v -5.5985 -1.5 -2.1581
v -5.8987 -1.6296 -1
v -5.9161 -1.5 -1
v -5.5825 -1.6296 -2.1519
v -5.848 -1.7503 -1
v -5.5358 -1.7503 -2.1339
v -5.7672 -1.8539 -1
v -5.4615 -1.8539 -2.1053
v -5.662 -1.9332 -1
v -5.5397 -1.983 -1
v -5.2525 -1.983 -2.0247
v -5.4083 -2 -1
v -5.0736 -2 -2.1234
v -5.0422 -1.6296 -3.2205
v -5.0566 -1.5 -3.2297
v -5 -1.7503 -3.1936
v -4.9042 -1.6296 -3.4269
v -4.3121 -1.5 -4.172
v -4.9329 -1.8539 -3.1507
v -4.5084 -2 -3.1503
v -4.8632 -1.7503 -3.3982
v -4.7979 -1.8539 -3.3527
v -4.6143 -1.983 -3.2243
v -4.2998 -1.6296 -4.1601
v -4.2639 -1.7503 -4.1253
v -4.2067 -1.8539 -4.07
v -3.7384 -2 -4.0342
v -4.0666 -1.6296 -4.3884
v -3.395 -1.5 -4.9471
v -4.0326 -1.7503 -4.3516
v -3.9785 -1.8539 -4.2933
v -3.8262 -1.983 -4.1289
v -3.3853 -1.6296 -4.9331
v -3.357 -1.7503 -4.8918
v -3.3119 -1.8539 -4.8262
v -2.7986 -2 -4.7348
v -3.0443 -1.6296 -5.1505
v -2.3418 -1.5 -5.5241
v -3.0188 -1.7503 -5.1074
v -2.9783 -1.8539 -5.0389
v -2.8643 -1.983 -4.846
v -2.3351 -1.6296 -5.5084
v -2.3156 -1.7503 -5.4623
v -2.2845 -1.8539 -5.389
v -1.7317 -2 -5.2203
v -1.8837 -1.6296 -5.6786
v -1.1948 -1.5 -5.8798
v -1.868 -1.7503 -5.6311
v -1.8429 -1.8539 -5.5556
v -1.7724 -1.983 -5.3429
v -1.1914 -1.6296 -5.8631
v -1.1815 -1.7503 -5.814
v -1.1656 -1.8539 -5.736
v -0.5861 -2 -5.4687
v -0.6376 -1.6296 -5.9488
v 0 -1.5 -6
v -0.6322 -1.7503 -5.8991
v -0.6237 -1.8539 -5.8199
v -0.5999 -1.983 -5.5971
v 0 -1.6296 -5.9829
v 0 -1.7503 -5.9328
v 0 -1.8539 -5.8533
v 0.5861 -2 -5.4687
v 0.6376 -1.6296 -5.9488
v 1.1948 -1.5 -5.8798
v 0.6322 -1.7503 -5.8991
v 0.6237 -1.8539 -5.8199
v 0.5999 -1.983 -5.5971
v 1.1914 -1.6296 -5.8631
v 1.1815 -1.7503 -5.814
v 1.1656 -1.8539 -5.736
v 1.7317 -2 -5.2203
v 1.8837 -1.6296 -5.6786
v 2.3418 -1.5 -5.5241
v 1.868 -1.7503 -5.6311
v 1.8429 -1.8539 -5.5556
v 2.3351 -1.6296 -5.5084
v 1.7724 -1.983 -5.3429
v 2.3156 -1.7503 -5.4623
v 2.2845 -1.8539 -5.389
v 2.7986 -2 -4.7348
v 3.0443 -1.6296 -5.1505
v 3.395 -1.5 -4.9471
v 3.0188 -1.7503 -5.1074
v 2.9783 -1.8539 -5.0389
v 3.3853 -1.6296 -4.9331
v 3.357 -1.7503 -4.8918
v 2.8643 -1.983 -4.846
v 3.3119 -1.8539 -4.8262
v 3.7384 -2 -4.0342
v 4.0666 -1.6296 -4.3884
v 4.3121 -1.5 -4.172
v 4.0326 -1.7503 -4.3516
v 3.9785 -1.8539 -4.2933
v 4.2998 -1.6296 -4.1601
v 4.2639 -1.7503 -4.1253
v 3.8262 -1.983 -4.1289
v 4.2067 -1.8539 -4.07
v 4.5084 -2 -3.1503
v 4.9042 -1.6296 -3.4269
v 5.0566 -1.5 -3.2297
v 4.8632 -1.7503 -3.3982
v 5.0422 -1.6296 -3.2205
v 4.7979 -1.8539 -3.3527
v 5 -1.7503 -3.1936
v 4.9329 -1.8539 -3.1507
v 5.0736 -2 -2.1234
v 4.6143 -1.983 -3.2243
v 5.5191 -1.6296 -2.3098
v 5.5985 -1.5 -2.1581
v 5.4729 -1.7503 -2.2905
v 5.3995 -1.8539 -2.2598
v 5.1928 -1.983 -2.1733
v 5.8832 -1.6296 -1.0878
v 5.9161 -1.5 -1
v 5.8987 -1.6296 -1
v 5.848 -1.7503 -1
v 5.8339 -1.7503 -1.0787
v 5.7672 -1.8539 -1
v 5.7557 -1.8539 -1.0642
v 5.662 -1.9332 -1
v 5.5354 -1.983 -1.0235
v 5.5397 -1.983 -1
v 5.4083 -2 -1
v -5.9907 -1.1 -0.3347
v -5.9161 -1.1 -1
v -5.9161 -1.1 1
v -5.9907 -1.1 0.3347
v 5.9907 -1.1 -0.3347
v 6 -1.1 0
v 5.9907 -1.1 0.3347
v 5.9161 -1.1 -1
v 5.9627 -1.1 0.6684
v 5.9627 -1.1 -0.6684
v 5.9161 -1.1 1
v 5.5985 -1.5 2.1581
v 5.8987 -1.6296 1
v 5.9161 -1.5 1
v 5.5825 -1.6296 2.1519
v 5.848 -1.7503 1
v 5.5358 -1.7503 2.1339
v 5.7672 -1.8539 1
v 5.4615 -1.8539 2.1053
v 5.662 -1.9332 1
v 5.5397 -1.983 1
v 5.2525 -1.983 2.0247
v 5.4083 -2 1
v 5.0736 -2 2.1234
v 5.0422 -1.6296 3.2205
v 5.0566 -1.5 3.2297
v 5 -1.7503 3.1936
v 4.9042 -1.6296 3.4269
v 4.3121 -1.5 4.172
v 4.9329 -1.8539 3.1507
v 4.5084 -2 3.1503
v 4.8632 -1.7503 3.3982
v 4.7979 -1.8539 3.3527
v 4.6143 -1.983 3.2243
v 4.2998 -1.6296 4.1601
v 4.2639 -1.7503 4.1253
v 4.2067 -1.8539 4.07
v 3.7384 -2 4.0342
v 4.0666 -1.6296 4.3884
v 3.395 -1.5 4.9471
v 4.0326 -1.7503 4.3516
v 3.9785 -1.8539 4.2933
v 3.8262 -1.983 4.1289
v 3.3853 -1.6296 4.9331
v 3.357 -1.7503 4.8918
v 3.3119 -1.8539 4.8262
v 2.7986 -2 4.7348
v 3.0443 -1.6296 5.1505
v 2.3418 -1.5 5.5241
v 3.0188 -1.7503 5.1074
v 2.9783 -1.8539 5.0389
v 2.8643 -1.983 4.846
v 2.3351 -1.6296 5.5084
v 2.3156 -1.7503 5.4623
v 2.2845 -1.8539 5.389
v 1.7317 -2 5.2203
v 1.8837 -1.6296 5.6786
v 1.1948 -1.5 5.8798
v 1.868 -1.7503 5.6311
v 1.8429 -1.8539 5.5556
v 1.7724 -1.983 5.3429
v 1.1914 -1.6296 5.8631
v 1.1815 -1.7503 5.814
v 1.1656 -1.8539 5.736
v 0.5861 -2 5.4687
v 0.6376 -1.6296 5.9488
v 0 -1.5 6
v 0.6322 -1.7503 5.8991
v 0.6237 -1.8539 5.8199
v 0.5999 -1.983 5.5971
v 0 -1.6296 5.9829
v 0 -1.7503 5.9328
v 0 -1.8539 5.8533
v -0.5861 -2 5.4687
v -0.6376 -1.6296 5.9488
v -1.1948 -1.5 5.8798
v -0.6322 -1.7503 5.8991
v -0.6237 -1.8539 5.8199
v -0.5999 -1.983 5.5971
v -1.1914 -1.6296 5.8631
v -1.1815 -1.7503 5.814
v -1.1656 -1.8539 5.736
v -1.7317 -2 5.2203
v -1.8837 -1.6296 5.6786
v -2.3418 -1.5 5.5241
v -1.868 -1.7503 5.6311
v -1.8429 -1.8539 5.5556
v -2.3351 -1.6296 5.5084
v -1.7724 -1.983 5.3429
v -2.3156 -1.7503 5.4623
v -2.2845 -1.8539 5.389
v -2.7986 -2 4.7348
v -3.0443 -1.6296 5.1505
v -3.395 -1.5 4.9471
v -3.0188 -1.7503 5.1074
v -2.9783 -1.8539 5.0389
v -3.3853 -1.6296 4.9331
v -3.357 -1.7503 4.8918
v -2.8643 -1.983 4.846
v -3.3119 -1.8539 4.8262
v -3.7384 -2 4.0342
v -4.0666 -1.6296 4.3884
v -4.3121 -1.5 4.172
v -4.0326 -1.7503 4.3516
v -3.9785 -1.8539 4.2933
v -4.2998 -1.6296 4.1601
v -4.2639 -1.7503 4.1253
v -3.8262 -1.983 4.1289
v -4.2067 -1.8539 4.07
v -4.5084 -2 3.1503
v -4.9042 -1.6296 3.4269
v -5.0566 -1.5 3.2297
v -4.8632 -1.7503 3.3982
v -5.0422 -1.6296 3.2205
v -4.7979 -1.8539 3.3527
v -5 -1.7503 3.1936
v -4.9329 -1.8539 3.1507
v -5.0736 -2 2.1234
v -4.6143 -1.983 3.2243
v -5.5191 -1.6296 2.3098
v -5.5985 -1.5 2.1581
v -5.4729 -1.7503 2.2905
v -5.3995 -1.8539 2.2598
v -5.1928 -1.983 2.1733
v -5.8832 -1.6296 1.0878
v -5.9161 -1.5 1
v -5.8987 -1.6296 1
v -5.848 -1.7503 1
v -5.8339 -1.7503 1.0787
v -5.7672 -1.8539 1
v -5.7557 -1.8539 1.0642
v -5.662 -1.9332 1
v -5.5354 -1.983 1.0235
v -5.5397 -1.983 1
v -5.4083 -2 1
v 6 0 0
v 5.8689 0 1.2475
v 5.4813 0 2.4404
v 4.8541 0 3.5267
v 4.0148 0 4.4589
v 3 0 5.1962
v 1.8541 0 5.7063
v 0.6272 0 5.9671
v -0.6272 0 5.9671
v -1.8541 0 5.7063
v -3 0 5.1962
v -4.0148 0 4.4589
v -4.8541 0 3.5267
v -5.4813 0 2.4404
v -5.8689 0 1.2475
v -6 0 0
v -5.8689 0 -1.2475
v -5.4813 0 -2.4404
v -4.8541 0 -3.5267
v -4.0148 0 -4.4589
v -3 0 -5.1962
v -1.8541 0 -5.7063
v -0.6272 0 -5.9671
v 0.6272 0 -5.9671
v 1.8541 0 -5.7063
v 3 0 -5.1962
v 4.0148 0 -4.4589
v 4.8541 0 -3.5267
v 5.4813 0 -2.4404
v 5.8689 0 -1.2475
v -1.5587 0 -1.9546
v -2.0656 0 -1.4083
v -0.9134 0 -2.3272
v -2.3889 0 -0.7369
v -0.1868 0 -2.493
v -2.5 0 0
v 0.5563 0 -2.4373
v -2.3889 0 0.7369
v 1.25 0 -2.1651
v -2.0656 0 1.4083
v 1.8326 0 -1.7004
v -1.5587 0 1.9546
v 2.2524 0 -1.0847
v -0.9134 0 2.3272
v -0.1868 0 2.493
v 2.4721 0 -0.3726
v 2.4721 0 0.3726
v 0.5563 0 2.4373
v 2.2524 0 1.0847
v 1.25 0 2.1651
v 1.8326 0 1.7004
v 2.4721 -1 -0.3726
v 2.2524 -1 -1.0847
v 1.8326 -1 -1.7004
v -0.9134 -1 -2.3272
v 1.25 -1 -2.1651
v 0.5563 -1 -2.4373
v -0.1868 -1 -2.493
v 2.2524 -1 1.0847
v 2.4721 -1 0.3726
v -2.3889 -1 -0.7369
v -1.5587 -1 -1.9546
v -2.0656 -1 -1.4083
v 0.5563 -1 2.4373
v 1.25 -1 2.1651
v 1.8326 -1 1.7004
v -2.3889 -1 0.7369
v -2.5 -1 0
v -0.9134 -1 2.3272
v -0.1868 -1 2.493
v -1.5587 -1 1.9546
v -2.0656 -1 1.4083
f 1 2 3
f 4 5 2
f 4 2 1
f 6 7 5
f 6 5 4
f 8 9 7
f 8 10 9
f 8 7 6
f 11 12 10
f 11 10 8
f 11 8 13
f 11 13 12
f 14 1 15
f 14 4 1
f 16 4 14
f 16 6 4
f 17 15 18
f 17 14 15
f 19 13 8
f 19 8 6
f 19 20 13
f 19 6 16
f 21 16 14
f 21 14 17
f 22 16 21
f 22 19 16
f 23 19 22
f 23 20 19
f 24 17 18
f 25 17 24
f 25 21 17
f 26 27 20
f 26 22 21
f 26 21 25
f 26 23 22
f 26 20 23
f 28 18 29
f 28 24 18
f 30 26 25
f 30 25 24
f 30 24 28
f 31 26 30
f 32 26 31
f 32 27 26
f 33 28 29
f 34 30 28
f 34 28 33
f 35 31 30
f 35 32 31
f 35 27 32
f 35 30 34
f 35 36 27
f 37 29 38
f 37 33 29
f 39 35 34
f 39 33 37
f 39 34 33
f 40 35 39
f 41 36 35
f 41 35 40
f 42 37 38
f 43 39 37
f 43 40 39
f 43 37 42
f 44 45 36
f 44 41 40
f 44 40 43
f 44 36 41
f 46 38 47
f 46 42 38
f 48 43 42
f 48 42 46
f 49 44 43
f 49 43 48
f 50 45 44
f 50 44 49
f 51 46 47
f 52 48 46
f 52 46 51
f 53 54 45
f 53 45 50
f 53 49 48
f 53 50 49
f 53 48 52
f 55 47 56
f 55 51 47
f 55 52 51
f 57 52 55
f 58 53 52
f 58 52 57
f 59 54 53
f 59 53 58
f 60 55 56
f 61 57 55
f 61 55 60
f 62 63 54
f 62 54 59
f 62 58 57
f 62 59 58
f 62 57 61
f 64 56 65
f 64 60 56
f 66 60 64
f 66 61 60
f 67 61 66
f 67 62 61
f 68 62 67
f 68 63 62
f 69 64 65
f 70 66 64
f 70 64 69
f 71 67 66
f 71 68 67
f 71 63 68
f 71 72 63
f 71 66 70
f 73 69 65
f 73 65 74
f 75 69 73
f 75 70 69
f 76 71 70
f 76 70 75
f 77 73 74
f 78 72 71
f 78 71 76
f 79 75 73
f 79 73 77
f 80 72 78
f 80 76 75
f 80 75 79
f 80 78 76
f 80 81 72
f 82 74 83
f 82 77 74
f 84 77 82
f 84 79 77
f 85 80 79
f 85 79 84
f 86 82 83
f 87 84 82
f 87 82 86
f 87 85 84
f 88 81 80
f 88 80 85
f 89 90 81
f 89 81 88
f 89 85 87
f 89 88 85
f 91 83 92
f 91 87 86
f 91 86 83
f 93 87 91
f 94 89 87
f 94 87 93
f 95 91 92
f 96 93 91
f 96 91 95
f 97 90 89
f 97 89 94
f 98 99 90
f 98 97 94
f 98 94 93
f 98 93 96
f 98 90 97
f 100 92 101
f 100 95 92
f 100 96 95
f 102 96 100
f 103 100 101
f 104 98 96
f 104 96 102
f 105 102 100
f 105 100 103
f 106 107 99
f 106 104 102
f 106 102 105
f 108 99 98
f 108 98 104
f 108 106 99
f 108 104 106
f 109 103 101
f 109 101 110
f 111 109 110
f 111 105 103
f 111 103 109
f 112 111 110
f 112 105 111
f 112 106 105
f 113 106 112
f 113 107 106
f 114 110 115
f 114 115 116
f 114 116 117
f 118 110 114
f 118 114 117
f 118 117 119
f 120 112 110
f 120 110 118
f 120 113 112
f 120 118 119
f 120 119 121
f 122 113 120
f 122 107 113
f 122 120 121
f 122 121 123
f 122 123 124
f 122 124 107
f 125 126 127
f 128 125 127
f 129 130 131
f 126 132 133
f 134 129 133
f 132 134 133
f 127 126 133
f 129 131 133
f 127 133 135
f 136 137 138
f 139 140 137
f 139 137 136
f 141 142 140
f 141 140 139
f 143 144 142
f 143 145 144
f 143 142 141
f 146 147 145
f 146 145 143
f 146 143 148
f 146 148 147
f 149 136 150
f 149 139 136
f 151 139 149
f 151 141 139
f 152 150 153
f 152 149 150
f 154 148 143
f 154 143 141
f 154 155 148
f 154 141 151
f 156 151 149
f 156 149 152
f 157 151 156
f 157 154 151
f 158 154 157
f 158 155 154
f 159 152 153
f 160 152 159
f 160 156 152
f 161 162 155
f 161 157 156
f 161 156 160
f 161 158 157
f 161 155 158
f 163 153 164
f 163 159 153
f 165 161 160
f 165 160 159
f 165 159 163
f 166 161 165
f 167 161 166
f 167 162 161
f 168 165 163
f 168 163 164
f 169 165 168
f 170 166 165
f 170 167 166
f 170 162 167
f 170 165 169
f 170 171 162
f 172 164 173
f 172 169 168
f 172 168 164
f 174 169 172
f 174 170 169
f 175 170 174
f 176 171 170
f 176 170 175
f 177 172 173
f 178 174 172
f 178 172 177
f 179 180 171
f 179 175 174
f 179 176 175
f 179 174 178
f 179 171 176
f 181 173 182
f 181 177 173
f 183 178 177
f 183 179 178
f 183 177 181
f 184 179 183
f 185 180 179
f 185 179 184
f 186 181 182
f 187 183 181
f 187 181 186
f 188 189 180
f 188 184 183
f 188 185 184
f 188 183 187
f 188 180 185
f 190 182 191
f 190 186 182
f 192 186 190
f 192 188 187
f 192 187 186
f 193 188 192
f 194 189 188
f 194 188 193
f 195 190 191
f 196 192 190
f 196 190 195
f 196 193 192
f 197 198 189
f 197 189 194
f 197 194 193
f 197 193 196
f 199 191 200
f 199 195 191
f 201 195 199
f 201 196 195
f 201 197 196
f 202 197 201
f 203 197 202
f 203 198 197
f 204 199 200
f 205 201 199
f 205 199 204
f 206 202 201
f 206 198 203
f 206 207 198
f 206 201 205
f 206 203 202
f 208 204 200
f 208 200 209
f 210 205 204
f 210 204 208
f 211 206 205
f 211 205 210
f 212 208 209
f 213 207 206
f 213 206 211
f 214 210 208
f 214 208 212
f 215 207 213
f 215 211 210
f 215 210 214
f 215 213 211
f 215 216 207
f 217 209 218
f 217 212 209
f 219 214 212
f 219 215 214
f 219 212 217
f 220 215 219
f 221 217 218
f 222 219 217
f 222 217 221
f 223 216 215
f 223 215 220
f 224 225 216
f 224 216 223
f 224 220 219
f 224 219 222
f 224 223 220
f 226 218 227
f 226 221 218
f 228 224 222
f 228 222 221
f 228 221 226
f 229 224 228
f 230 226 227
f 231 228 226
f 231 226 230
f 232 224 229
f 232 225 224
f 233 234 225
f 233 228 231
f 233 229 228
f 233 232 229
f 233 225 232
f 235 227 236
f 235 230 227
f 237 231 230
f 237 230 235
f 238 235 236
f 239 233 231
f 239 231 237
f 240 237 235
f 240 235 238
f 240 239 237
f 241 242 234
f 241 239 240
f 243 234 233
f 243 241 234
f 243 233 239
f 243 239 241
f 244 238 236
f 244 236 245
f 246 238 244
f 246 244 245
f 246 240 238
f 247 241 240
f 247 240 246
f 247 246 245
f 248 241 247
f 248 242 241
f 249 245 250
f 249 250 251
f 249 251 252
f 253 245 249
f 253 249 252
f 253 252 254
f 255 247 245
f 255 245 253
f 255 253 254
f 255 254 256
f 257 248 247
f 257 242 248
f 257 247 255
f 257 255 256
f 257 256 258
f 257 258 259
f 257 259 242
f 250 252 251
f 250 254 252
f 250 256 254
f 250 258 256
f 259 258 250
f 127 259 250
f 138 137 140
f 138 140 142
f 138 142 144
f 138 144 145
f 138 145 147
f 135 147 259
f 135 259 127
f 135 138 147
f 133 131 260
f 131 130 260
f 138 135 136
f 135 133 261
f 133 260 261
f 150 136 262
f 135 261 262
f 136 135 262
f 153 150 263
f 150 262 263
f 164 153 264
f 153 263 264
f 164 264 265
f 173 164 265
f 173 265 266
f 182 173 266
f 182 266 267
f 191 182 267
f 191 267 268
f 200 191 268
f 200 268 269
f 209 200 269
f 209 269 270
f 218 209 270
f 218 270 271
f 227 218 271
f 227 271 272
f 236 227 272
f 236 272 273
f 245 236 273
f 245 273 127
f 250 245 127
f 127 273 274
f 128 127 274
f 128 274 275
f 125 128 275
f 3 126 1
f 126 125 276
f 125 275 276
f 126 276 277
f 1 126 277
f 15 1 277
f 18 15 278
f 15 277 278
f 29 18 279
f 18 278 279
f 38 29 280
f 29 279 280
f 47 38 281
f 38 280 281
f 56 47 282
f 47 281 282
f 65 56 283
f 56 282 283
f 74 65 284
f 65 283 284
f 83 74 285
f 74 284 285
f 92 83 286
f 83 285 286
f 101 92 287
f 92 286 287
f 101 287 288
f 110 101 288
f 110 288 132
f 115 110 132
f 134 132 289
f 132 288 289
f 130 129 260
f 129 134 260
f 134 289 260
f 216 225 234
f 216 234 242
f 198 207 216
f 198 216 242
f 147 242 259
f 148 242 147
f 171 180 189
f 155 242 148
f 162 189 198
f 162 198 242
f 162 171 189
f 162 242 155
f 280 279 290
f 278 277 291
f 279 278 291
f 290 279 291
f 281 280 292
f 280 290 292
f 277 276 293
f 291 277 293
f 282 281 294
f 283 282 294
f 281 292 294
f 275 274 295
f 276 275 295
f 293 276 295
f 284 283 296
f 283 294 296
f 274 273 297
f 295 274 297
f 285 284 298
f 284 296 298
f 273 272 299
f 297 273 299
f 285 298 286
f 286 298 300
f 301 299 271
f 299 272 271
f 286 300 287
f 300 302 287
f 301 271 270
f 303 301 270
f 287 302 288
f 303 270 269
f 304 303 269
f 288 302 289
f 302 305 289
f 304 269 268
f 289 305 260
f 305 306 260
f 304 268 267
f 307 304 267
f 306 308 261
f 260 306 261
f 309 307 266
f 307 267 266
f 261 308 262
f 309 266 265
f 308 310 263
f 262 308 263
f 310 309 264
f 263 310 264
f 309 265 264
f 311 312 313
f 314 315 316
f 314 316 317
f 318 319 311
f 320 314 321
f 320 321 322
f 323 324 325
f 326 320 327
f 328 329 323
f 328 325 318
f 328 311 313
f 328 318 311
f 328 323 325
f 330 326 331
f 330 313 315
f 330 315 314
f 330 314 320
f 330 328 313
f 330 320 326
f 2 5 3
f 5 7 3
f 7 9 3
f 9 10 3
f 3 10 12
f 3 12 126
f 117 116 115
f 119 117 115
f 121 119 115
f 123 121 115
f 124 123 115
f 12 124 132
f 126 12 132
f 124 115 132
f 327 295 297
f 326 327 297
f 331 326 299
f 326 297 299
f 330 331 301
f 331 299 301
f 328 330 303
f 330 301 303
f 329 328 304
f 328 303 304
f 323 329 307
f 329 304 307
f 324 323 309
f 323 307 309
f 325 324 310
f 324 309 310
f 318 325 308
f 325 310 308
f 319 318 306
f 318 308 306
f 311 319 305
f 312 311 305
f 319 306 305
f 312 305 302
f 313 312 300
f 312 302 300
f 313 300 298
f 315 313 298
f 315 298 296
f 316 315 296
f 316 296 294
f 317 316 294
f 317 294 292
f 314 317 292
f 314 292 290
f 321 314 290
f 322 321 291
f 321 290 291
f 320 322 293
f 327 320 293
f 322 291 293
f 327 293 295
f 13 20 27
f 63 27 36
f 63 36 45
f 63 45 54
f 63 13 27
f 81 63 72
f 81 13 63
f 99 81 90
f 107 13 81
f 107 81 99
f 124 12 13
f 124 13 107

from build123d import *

# Parameters (mm, degrees)
F0_R     = 6
F1_DEPTH = 2
F2_R     = 2.5
F3_DEPTH = 1
F4_W     = 2.0085166757
F4_H     = 2
F5_DEPTH = 12.5
F6_R     = 0.5


with BuildPart() as f1:
    # F0 (on Front) → F1 (new body)
    with BuildSketch(Plane.XZ):
        Circle(F0_R)
    extrude(amount=F1_DEPTH)

    # F2 (on face) → F3 (cut)
    with BuildSketch(Plane(origin=(0, 0, 0), x_dir=(-1, 0, 0), z_dir=(0, 1, 0))):
        Circle(F2_R)
    extrude(amount=-F3_DEPTH, mode=Mode.SUBTRACT)

    # F4 (on Right) → F5 (cut, symmetric)
    with BuildSketch(Plane.YZ):
        with Locations((-2.1042583379, 0)):
            Rectangle(F4_W, F4_H)
    extrude(amount=F5_DEPTH, both=True, mode=Mode.SUBTRACT)

    # F6
    f6_edges = [f1.edges().sort_by_distance(p)[0] for p in [
        (0, -2, -6),
        (0, -2, 6),
    ]]
    fillet(f6_edges, radius=F6_R)


solid = f1.part
